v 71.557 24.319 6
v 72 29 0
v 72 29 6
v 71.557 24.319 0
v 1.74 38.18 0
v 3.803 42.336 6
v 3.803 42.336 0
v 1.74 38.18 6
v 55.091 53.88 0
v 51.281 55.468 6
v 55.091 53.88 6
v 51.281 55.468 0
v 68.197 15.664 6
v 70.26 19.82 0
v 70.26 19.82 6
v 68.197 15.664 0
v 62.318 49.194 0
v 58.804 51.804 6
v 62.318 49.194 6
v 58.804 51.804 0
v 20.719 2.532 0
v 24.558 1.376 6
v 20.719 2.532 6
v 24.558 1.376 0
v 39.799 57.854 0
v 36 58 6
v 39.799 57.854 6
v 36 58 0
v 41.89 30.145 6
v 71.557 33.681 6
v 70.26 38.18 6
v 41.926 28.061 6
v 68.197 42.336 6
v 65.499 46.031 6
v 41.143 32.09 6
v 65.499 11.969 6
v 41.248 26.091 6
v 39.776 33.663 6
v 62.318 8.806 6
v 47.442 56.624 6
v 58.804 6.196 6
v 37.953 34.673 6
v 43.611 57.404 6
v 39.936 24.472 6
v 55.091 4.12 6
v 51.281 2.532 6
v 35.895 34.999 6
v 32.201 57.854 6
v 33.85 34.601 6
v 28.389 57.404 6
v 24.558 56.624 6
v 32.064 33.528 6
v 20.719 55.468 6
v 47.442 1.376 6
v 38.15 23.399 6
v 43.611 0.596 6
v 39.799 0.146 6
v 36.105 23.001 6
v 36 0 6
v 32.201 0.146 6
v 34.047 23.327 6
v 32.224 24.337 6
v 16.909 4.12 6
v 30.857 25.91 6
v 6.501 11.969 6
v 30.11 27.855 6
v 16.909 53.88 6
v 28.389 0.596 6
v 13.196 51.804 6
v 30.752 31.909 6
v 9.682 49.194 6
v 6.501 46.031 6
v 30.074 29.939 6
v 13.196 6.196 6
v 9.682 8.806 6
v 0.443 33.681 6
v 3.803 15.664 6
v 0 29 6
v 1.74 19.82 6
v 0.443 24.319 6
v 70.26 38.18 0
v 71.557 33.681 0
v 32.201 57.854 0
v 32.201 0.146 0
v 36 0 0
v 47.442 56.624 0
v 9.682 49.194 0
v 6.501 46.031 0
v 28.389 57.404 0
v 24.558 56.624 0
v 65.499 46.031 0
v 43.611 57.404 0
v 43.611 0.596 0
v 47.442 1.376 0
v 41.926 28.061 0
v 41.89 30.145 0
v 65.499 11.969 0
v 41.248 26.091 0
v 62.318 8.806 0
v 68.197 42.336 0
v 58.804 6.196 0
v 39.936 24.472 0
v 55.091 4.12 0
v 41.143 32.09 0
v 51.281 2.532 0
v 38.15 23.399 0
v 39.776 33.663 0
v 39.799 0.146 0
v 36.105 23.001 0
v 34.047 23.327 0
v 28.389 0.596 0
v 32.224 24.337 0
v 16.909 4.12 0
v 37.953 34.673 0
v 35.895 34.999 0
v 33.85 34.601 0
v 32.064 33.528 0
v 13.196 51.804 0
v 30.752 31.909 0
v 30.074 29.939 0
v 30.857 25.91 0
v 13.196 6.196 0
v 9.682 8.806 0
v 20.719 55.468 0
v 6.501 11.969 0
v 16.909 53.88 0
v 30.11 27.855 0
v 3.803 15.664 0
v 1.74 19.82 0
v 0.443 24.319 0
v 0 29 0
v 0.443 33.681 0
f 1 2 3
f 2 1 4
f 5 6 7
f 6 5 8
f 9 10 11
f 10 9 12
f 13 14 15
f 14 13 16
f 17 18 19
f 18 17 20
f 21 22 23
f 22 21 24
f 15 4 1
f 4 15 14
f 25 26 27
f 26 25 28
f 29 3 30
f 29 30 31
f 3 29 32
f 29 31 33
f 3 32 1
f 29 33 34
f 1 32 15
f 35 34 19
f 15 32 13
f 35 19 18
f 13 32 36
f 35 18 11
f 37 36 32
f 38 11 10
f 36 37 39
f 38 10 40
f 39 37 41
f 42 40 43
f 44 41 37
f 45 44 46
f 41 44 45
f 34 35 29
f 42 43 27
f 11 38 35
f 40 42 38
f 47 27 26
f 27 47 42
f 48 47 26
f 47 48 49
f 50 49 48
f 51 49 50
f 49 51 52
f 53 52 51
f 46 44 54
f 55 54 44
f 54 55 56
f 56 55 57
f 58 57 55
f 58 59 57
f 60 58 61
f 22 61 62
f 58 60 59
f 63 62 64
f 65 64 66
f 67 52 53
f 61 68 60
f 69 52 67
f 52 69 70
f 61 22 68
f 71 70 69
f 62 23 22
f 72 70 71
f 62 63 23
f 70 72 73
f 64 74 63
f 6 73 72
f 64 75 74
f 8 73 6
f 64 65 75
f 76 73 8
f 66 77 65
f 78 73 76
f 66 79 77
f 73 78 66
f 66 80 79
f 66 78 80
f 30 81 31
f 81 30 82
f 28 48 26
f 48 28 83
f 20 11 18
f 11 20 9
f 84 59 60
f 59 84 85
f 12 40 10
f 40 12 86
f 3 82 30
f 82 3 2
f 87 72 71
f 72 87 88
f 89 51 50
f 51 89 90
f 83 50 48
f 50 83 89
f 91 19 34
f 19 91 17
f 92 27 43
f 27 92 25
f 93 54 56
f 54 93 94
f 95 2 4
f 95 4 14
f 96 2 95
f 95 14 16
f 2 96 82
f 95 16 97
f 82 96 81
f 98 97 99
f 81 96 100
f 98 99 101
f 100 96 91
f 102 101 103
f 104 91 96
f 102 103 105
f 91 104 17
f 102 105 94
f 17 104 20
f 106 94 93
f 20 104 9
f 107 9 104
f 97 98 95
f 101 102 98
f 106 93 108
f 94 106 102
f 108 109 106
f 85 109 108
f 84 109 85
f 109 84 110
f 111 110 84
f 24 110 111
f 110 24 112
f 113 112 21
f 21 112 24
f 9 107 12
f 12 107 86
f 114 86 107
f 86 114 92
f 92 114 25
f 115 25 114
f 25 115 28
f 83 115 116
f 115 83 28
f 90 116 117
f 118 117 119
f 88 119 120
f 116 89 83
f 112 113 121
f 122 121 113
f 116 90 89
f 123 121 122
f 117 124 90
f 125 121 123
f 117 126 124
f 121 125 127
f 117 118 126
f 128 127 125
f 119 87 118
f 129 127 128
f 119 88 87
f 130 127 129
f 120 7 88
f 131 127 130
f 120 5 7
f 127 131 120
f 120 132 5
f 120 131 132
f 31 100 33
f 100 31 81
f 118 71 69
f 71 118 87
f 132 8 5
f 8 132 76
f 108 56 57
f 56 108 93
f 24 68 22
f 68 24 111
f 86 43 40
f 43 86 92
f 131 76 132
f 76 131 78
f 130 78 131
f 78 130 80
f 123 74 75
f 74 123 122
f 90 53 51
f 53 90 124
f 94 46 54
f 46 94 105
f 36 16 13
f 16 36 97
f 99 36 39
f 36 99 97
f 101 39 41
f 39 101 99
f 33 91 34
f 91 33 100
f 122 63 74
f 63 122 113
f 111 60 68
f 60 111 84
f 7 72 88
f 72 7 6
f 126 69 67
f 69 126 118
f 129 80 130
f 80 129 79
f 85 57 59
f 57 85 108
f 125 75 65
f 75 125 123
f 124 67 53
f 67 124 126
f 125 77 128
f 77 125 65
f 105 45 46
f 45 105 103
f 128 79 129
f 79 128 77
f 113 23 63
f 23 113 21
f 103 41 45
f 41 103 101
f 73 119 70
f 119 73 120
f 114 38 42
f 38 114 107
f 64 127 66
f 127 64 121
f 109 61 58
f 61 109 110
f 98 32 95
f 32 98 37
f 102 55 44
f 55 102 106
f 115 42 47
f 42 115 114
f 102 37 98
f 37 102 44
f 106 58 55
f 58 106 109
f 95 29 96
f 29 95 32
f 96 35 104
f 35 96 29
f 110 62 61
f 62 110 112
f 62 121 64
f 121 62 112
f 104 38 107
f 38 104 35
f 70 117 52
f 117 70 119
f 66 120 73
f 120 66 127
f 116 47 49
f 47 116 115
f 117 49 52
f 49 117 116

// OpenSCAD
$fn = 32;

// ----------------------------------------------------------------------
// Cam plate: double_lobe cam, base R28
// ----------------------------------------------------------------------

// --- parameters (mm) ---
base_r = 28;              // base circle radius
lobe_h = 8;               // cam lobe rise
bore_r = 6;               // shaft bore radius
plate_t = 6;              // plate thickness, Z (extrusion height)

profile = [[72, 29], [71.557, 33.681], [70.26, 38.18], [68.197, 42.336], [65.499, 46.031], [62.318, 49.194], [58.804, 51.804], [55.091, 53.88], [51.281, 55.468], [47.442, 56.624], [43.611, 57.404], [39.799, 57.854], [36, 58], [32.201, 57.854], [28.389, 57.404], [24.558, 56.624], [20.719, 55.468], [16.909, 53.88], [13.196, 51.804], [9.682, 49.194], [6.501, 46.031], [3.803, 42.336], [1.74, 38.18], [0.443, 33.681], [0, 29], [0.443, 24.319], [1.74, 19.82], [3.803, 15.664], [6.501, 11.969], [9.682, 8.806], [13.196, 6.196], [16.909, 4.12], [20.719, 2.532], [24.558, 1.376], [28.389, 0.596], [32.201, 0.146], [36, 0], [39.799, 0.146], [43.611, 0.596], [47.442, 1.376], [51.281, 2.532], [55.091, 4.12], [58.804, 6.196], [62.318, 8.806], [65.499, 11.969], [68.197, 15.664], [70.26, 19.82], [71.557, 24.319]];  // primary outline, 48 points, counter clockwise
void_1 = [[41.89, 30.145], [41.143, 32.09], [39.776, 33.663], [37.953, 34.673], [35.895, 34.999], [33.85, 34.601], [32.064, 33.528], [30.752, 31.909], [30.074, 29.939], [30.11, 27.855], [30.857, 25.91], [32.224, 24.337], [34.047, 23.327], [36.105, 23.001], [38.15, 23.399], [39.936, 24.472], [41.248, 26.091], [41.926, 28.061]];  // shaft bore, 18 points

// --- the one profile operation ---
difference() {
  linear_extrude(height = plate_t) polygon(points = profile);
  translate([0, 0, -1])
    linear_extrude(height = plate_t + 2) polygon(points = void_1);
}
